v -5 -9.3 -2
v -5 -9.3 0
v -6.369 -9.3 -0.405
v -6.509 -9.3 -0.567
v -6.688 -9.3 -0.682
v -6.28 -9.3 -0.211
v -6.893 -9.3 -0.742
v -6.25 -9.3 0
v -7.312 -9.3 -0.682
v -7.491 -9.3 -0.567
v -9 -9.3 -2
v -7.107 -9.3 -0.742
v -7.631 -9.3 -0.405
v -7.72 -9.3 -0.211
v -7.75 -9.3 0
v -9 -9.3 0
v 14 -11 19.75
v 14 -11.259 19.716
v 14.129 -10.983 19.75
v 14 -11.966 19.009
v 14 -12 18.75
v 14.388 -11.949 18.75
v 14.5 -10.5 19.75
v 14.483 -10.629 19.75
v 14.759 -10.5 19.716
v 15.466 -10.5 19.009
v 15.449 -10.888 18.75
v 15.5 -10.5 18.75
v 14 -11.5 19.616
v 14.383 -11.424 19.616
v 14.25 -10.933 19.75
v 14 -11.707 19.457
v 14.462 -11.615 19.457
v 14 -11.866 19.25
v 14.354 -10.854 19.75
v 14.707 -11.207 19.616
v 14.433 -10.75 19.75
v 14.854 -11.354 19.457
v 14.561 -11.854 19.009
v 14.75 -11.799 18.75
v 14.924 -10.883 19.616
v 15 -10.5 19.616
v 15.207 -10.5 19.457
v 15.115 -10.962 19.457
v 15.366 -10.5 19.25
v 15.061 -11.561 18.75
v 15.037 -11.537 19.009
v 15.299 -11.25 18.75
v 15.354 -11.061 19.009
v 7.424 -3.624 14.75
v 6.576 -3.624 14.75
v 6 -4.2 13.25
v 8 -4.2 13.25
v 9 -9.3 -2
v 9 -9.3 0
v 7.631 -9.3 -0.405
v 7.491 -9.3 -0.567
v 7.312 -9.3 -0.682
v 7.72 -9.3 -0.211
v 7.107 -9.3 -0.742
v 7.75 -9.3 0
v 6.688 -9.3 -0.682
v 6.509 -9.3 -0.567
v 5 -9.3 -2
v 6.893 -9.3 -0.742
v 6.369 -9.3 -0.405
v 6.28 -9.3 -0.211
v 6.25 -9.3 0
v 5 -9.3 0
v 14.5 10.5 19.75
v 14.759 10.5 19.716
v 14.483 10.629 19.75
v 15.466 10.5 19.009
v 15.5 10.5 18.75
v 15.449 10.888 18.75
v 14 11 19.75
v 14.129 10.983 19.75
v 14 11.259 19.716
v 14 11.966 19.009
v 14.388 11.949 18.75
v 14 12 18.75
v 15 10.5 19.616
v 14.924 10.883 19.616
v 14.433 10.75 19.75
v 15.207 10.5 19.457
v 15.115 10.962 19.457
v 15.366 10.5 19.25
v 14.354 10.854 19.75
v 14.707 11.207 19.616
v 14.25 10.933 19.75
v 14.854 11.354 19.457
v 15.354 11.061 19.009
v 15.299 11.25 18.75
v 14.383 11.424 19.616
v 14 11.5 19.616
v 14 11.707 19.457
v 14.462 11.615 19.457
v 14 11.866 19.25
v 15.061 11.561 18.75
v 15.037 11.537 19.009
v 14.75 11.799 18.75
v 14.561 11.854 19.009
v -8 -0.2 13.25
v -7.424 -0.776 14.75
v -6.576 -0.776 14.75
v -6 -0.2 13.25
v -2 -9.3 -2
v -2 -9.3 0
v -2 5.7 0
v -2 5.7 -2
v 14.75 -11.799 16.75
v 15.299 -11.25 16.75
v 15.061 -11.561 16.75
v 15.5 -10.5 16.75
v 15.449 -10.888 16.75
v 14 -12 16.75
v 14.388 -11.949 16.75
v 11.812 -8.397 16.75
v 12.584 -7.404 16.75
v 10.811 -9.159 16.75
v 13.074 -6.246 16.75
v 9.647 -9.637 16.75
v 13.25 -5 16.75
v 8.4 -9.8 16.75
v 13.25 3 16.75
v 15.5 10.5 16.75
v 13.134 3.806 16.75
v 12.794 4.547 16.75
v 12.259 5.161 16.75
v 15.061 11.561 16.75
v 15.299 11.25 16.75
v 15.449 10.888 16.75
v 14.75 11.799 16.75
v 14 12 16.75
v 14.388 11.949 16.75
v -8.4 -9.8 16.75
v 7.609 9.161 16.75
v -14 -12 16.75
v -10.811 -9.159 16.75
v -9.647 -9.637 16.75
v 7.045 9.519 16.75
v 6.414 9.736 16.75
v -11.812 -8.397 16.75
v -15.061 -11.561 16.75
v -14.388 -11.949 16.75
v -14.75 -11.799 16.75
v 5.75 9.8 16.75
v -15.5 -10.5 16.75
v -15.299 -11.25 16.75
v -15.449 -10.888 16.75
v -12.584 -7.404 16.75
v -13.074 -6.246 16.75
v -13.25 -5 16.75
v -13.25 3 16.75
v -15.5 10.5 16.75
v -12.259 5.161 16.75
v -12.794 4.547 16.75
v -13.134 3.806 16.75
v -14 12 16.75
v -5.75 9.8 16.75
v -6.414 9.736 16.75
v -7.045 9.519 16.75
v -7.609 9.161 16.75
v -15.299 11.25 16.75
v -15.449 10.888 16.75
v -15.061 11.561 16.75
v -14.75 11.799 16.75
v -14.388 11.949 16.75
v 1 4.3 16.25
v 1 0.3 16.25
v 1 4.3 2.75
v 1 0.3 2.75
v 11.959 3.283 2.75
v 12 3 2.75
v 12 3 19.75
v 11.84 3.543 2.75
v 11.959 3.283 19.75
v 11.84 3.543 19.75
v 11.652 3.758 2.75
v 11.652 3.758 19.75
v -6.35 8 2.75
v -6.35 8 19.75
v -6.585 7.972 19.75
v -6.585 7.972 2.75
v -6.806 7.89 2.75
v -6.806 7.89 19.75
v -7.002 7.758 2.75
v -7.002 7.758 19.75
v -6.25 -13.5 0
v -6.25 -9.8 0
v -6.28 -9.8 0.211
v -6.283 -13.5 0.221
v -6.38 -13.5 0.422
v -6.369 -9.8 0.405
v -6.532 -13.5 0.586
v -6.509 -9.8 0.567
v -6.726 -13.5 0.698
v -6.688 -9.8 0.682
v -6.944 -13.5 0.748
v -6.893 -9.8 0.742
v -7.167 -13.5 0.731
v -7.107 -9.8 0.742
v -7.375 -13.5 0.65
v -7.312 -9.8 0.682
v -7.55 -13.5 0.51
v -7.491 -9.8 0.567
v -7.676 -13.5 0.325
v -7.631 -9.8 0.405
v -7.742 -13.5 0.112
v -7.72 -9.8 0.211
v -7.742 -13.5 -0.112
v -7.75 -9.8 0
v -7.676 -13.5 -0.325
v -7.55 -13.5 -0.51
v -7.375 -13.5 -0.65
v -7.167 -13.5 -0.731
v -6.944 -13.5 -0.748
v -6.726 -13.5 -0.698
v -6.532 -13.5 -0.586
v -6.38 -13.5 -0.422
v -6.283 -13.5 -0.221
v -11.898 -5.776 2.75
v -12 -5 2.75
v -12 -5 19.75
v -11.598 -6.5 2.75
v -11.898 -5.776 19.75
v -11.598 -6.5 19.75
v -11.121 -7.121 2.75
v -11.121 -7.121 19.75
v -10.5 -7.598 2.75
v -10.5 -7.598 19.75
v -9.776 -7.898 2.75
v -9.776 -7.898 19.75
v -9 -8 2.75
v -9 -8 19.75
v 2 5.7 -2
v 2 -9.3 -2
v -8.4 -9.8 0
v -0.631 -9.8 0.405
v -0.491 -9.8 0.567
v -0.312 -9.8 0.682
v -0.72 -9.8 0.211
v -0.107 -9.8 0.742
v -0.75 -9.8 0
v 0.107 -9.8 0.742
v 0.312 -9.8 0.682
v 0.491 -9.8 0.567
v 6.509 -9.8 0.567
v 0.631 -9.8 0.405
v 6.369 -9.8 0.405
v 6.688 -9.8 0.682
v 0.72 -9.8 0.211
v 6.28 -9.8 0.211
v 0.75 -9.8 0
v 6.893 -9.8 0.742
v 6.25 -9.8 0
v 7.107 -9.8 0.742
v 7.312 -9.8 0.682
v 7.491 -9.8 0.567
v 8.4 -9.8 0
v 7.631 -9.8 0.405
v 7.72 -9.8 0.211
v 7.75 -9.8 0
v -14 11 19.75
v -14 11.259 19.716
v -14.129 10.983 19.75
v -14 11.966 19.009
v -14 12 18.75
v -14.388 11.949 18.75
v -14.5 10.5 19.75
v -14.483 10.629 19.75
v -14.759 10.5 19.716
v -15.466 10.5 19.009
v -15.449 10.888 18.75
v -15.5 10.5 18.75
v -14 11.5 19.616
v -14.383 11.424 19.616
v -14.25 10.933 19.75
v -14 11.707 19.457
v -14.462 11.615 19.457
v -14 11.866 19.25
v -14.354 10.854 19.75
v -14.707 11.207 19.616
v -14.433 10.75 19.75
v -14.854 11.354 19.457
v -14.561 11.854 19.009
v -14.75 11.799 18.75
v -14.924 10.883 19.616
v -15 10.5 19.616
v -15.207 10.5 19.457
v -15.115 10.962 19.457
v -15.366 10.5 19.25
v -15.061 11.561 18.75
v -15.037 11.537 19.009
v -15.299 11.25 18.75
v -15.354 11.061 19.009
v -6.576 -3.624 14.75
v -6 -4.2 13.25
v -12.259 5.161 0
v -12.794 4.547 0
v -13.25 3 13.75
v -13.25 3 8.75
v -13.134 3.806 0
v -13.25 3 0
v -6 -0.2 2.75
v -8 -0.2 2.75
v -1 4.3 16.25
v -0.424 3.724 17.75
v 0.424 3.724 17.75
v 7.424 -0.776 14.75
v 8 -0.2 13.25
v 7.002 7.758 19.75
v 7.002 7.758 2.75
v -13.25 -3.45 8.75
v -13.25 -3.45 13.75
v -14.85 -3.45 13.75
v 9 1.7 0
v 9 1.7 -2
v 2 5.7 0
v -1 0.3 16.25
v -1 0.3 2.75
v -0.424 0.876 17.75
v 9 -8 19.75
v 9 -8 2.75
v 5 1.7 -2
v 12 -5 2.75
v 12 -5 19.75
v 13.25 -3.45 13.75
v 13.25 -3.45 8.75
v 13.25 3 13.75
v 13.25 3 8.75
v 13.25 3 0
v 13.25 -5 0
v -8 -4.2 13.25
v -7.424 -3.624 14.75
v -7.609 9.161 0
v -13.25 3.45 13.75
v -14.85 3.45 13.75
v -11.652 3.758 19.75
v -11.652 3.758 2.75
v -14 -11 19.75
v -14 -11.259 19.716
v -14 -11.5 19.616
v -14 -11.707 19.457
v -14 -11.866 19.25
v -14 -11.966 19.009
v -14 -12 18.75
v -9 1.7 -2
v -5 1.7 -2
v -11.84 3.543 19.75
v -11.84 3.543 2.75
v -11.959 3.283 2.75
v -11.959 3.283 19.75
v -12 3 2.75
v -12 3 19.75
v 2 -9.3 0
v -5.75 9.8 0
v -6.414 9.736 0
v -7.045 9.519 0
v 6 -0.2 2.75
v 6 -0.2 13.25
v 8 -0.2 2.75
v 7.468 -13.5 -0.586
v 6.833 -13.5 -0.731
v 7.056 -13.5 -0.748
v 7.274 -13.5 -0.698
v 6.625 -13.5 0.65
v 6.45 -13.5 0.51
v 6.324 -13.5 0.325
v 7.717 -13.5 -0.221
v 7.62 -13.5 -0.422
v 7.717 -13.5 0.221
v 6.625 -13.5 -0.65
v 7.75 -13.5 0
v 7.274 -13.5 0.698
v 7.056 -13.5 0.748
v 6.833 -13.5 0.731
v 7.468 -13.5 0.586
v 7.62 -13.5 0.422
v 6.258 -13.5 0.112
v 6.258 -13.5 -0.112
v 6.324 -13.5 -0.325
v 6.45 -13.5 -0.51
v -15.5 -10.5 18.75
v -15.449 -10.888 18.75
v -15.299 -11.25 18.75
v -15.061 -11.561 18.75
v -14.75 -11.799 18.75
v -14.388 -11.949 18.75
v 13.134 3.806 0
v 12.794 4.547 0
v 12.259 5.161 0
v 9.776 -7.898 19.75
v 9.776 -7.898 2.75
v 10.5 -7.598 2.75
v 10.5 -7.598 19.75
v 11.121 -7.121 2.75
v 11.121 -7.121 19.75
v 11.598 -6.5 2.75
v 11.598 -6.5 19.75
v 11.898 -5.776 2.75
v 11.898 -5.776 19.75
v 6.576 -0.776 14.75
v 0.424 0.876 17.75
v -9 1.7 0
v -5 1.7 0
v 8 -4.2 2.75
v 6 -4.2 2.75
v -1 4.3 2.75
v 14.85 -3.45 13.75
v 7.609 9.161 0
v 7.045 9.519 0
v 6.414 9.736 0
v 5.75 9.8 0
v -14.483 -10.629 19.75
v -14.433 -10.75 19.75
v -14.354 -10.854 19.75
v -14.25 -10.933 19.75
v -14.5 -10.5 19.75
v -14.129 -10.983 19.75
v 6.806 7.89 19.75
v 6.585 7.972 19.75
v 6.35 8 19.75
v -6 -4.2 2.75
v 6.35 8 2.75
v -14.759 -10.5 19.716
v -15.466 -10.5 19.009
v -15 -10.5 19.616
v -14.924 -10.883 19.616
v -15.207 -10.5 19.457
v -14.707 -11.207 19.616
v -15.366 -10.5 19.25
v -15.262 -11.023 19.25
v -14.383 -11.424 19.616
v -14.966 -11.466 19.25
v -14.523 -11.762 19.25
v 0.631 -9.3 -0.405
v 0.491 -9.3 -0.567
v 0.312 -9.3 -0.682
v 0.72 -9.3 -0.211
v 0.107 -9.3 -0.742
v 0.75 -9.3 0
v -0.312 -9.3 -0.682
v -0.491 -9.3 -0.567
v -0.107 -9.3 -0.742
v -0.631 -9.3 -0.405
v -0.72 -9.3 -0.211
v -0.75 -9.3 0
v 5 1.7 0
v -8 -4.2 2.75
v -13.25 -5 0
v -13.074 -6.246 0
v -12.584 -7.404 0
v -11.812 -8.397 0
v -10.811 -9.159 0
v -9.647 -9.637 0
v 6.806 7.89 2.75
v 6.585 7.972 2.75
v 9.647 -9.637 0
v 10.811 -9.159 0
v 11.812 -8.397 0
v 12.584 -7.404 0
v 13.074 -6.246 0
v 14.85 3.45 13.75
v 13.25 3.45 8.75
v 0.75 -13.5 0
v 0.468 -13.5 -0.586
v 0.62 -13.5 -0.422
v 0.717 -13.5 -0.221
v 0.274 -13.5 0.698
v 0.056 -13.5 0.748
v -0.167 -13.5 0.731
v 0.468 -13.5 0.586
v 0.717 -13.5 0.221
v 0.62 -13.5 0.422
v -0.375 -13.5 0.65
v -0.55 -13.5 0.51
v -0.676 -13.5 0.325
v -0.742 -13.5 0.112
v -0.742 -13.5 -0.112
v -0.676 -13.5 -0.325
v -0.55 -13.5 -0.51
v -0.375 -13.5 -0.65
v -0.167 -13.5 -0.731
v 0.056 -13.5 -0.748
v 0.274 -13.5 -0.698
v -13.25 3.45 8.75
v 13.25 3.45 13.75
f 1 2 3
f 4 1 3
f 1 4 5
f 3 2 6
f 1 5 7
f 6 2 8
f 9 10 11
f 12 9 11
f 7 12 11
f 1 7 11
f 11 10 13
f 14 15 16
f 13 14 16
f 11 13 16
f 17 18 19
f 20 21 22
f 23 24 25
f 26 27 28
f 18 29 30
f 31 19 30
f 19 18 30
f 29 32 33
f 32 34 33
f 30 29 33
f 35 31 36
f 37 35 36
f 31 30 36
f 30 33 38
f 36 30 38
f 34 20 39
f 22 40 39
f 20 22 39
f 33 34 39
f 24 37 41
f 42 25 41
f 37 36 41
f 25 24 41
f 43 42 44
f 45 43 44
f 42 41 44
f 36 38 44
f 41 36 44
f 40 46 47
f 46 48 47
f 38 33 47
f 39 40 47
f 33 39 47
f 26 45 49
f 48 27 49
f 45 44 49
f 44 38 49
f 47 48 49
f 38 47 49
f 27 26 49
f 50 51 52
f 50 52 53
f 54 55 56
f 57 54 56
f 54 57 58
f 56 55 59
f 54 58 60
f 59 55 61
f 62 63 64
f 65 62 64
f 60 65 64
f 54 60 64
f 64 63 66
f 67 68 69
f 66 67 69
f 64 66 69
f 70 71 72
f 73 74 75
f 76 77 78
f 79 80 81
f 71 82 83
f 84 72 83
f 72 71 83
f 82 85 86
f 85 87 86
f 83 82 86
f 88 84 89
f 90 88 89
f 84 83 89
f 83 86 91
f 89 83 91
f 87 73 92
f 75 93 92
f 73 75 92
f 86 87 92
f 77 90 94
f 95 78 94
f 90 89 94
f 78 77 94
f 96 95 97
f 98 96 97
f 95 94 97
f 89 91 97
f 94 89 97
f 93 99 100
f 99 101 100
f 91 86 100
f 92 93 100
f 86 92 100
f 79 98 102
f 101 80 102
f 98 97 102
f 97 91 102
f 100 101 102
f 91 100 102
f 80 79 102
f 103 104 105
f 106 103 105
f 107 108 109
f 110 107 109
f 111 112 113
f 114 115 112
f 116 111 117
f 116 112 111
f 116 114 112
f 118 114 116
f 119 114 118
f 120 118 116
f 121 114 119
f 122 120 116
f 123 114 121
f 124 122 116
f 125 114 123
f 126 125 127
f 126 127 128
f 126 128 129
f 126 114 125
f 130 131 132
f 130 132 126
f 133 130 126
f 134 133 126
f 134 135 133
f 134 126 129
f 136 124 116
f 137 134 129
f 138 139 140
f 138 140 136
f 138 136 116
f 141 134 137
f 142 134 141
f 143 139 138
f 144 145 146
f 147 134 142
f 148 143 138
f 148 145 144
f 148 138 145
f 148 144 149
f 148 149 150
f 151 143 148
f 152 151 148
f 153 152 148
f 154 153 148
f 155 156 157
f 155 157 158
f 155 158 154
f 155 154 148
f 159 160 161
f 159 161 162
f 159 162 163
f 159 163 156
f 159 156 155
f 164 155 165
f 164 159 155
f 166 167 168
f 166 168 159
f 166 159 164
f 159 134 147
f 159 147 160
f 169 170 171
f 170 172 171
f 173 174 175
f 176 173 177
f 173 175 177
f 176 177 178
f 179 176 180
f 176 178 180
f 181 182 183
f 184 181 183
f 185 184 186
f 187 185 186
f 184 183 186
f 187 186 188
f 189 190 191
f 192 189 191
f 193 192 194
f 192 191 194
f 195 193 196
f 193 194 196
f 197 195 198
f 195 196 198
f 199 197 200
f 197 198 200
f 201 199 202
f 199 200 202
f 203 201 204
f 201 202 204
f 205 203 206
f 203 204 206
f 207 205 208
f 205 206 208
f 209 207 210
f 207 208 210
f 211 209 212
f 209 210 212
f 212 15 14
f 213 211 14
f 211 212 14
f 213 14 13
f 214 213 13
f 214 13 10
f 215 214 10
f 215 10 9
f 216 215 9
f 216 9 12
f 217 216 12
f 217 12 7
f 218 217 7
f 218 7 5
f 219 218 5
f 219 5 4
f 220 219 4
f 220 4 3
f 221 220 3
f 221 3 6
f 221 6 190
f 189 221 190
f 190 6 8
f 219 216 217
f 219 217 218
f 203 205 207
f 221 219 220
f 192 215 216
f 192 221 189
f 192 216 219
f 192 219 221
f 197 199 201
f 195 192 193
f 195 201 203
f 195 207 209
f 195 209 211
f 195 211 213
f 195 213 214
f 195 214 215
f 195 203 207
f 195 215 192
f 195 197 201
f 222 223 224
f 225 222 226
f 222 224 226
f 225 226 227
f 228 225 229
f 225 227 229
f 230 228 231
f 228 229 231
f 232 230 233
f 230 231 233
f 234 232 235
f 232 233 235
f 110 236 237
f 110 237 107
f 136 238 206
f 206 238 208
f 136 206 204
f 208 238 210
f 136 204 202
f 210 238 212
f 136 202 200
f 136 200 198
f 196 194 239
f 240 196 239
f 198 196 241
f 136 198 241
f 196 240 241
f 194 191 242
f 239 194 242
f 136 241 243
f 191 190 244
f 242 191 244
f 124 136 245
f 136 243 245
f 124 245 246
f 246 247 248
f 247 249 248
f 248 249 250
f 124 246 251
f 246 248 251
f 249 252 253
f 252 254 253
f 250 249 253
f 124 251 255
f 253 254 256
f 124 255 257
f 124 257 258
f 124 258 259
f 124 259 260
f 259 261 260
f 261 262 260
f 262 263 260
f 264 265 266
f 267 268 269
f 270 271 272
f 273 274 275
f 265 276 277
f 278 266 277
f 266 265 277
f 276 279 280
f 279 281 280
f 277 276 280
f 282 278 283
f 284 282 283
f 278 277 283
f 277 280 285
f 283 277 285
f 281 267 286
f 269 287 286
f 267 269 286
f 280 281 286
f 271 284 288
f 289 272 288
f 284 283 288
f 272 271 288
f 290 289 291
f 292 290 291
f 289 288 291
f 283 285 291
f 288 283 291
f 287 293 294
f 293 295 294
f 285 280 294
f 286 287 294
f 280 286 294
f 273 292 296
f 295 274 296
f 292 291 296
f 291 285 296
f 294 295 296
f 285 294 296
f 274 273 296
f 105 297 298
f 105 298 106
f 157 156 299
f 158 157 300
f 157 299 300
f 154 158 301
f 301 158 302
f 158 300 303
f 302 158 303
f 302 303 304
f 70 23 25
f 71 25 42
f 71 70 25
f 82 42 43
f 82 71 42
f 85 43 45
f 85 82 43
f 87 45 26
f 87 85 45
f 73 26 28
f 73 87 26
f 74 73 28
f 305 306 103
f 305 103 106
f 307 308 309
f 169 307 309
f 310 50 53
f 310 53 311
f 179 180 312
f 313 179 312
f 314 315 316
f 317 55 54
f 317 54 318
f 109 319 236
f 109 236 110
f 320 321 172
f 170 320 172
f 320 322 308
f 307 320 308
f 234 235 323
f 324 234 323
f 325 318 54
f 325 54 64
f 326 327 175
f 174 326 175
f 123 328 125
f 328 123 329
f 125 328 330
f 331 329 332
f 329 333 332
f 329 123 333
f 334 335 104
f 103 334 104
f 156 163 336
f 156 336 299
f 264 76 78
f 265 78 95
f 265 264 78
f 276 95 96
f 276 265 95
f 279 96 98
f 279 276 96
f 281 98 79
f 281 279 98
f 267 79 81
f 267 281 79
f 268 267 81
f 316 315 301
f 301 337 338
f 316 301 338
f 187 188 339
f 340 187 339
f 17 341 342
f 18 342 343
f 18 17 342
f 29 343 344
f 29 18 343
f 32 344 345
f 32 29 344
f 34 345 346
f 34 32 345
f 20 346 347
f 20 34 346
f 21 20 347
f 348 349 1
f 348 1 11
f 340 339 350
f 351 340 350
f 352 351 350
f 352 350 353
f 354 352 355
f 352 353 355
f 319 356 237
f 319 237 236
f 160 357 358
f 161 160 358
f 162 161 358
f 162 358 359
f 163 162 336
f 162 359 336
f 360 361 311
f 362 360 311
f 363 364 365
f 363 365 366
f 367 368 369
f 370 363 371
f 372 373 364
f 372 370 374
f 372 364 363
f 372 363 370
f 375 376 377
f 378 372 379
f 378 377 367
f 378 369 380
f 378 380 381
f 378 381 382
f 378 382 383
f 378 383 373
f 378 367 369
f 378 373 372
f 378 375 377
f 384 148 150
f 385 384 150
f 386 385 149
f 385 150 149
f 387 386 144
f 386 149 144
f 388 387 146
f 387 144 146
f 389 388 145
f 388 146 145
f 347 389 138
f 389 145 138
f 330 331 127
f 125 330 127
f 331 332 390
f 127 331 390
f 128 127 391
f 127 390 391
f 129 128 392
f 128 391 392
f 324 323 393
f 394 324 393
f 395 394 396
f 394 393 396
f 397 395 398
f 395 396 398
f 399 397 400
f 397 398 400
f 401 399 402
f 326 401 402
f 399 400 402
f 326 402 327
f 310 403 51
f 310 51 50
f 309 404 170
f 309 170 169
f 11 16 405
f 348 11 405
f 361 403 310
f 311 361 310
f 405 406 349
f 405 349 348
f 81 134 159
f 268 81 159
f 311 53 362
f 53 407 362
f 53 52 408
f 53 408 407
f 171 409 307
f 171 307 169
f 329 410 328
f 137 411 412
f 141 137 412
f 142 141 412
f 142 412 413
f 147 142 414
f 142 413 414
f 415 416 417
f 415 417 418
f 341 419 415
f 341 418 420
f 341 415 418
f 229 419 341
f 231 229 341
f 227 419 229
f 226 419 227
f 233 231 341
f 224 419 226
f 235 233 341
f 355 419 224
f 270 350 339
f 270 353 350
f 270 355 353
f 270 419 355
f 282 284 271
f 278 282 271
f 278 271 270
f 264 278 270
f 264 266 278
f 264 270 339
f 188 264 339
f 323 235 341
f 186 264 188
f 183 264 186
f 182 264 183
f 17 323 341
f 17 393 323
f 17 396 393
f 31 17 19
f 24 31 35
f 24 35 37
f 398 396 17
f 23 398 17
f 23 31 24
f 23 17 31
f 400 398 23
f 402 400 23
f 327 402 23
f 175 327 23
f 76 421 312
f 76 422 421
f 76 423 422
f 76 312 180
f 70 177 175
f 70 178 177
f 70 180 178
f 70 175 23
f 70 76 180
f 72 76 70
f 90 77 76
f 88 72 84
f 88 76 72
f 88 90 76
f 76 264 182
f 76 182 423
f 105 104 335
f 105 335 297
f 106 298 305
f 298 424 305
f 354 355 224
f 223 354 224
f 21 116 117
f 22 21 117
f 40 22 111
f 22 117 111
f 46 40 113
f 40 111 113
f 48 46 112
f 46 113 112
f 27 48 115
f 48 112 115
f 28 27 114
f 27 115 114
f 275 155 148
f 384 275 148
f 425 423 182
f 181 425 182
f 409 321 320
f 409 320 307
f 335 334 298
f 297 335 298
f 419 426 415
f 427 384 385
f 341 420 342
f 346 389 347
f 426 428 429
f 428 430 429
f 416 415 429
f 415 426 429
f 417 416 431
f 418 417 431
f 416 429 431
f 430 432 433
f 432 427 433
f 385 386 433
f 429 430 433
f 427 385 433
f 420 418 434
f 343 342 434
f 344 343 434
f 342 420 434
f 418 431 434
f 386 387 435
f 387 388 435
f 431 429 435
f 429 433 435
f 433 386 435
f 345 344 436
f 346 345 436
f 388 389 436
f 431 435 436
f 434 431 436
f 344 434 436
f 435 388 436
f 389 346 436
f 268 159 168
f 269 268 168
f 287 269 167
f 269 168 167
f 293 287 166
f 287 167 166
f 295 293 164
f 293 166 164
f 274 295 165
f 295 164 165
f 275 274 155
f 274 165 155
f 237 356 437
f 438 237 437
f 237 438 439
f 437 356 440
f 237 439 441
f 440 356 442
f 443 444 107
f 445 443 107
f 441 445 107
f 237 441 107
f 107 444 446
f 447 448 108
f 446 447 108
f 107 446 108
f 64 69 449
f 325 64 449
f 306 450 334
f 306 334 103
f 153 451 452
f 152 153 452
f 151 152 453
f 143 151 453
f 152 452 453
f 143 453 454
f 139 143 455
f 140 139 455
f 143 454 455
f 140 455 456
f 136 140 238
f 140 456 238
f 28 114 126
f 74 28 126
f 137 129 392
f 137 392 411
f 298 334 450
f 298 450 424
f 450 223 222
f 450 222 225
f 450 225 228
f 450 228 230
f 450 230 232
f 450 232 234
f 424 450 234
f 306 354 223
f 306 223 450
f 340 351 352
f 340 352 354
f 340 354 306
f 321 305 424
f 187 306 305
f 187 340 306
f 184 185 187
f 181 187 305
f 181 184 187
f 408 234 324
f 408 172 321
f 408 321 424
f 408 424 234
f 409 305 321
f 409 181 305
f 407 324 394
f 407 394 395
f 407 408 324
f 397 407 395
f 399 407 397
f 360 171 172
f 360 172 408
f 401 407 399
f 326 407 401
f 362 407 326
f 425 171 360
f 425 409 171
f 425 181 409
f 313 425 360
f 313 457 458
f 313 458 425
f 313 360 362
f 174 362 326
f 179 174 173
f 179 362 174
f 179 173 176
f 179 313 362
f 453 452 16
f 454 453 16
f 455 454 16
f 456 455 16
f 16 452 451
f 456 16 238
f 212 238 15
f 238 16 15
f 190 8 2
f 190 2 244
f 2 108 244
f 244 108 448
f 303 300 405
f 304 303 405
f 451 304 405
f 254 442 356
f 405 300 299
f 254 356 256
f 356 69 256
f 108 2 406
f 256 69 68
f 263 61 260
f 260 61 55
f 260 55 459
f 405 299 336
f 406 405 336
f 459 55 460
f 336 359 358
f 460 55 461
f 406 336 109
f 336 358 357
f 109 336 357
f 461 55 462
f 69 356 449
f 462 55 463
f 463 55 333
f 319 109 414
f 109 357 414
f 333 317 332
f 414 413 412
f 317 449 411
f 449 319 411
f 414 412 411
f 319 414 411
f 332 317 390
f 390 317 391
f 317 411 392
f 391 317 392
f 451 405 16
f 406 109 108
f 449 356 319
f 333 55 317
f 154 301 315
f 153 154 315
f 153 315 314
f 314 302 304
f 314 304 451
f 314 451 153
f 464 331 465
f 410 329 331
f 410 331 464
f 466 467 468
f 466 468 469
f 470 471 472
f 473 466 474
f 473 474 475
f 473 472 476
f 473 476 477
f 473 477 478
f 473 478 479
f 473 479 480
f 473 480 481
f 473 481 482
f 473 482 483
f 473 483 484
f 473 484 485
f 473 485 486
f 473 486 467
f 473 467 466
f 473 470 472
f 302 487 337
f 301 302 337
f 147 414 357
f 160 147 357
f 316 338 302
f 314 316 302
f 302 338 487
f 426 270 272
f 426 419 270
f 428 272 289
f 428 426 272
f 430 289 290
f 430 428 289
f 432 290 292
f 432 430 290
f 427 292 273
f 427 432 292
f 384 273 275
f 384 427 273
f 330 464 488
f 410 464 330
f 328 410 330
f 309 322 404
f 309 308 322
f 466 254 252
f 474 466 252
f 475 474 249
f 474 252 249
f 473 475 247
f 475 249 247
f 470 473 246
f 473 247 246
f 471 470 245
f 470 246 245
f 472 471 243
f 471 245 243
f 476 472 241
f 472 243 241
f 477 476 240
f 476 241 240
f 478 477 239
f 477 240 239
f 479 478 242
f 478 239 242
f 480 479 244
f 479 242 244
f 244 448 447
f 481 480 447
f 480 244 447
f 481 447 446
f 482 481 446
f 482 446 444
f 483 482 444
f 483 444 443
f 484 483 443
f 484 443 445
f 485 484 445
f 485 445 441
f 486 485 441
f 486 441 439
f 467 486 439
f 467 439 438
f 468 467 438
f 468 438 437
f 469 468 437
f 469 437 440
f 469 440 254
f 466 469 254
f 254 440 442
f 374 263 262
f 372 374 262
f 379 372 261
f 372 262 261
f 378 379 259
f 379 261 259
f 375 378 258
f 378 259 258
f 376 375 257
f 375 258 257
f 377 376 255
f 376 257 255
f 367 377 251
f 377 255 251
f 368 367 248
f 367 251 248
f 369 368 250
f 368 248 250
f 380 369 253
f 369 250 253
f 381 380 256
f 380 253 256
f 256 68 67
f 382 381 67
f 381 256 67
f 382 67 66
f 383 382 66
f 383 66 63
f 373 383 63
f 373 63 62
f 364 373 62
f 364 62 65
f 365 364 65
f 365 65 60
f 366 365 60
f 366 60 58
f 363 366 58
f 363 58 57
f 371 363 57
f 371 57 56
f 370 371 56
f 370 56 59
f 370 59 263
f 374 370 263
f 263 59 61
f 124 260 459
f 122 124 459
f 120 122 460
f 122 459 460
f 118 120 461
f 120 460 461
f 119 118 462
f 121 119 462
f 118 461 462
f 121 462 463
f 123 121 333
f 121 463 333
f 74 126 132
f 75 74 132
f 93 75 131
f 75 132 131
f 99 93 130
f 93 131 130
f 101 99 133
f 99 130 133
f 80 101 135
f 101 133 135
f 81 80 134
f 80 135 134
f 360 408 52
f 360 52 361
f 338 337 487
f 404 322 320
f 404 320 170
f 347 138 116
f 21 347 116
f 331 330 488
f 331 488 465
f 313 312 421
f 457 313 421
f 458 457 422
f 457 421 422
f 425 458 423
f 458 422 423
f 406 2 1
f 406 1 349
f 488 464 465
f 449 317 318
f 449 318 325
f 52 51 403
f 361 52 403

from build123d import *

# Parameters (mm, degrees)
EXTRUDE1_DEPTH         = 19.75
CUT_EXTRUDE1_DEPTH     = 17
SKETCH3_OUTSIDE_W      = 41.78
SKETCH3_OUTSIDE_H      = 34.78
CUT_EXTRUDE2_DEPTH     = 16.75
SKETCH4_W              = 2
SKETCH4_H              = 4
EXTRUDE2_DEPTH         = 15
SKETCH5_W              = 2
SKETCH5_H              = 4
CUT_EXTRUDE3_DEPTH     = 3
CHAMFER1_SIZE          = 1.5
CHAMFER1_SIZE2         = 0.575796053
CHAMFER1_PART_2_SIZE   = 1.5
CHAMFER1_PART_2_SIZE2  = 0.575796053
CHAMFER1_PART_3_SIZE   = 1.5
CHAMFER1_PART_3_SIZE2  = 0.575796053
CHAMFER1_PART_4_SIZE   = 1.5
CHAMFER1_PART_4_SIZE2  = 0.575796053
CHAMFER1_PART_5_SIZE   = 1.5
CHAMFER1_PART_5_SIZE2  = 0.575796053
CHAMFER1_PART_6_SIZE   = 1.5
CHAMFER1_PART_6_SIZE2  = 0.575796053
CHAMFER1_PART_7_SIZE   = 1.5
CHAMFER1_PART_7_SIZE2  = 0.575796053
CHAMFER1_PART_8_SIZE   = 1.5
CHAMFER1_PART_8_SIZE2  = 0.575796053
CHAMFER1_PART_9_SIZE   = 1.5
CHAMFER1_PART_9_SIZE2  = 0.575796053
CHAMFER1_PART_10_SIZE  = 1.5
CHAMFER1_PART_10_SIZE2 = 0.575796053
CHAMFER1_PART_11_SIZE  = 1.5
CHAMFER1_PART_11_SIZE2 = 0.575796053
CHAMFER1_PART_12_SIZE  = 1.5
CHAMFER1_PART_12_SIZE2 = 0.575796053
FILLET1_R              = 1
EXTRUDE3_DEPTH         = 3.45
SKETCH7_W              = 4
SKETCH7_H              = 15
SKETCH7_H_2            = 11
EXTRUDE4_DEPTH         = 2
SKETCH8_R              = 0.75
EXTRUDE5_DEPTH         = 4.2


with BuildPart() as part:
    # Sketch1 → Extrude1 (new body)
    with BuildSketch(Plane.XY):
        with BuildLine():
            Line((-14, -12), (14, -12))
            ThreePointArc((14, -12), (15.060660172, -11.560660172), (15.5, -10.5))
            Line((15.5, -10.5), (15.5, 10.5))
            ThreePointArc((15.5, 10.5), (15.060660172, 11.560660172), (14, 12))
            Line((14, 12), (-14, 12))
            ThreePointArc((-14, 12), (-15.060660172, 11.560660172), (-15.5, 10.5))
            Line((-15.5, 10.5), (-15.5, -10.5))
            ThreePointArc((-15.5, -10.5), (-15.060660172, -11.560660172), (-14, -12))
        make_face()
    extrude(amount=EXTRUDE1_DEPTH)

    # Sketch2 → Cut-Extrude1 (cut)
    with BuildSketch(Plane.XY.offset(19.75)):
        with BuildLine():
            Line((-12, 3), (-12, -5))
            ThreePointArc((-12, -5), (-11.121320344, -7.121320344), (-9, -8))
            Line((-9, -8), (9, -8))
            ThreePointArc((9, -8), (11.121320344, -7.121320344), (12, -5))
            Line((12, -5), (12, 3))
            ThreePointArc((12, 3), (11.908882001, 3.417053364), (11.652132983, 3.758104592))
            Line((11.652132983, 3.758104592), (7.002132983, 7.758104592))
            ThreePointArc((7.002132983, 7.758104592), (6.697775364, 7.937577888), (6.35, 8))
            Line((6.35, 8), (-6.35, 8))
            ThreePointArc((-6.35, 8), (-6.697775364, 7.937577888), (-7.002132983, 7.758104592))
            Line((-7.002132983, 7.758104592), (-11.652132983, 3.758104592))
            ThreePointArc((-11.652132983, 3.758104592), (-11.908882001, 3.417053364), (-12, 3))
        make_face()
    extrude(amount=-CUT_EXTRUDE1_DEPTH, mode=Mode.SUBTRACT)

    # Sketch3 outside → Cut-Extrude2 (cut)
    with BuildSketch(Plane(origin=(0, 0, 0), x_dir=(-1, 0, 0), z_dir=(0, 0, -1))):
        Rectangle(SKETCH3_OUTSIDE_W, SKETCH3_OUTSIDE_H)
        with BuildLine():
            Line((13.25, 3), (13.25, -5))
            ThreePointArc((13.25, -5), (11.811910569, -8.397190887), (8.4, -9.8))
            Line((8.4, -9.8), (-8.4, -9.8))
            ThreePointArc((-8.4, -9.8), (-11.811910569, -8.397190887), (-13.25, -5))
            Line((-13.25, -5), (-13.25, 3))
            ThreePointArc((-13.25, 3), (-12.990313702, 4.188602088), (-12.258579001, 5.160598088))
            Line((-12.258579001, 5.160598088), (-7.608579001, 9.160598088))
            ThreePointArc((-7.608579001, 9.160598088), (-6.736153383, 9.645587911), (-5.75, 9.8))
            Line((-5.75, 9.8), (5.75, 9.8))
            ThreePointArc((5.75, 9.8), (6.736153383, 9.645587911), (7.608579001, 9.160598088))
            Line((7.608579001, 9.160598088), (12.258579001, 5.160598088))
            ThreePointArc((12.258579001, 5.160598088), (12.990313702, 4.188602088), (13.25, 3))
        make_face(mode=Mode.SUBTRACT)
    extrude(amount=-CUT_EXTRUDE2_DEPTH, mode=Mode.SUBTRACT)

    # Sketch4 → Extrude2 (add)
    with BuildSketch(Plane.XY.offset(2.75)):
        with Locations((0, 2.3)):
            Rectangle(SKETCH4_W, SKETCH4_H)
        with Locations((-7, -2.2)):
            Rectangle(SKETCH4_W, SKETCH4_H)
        with Locations((7, -2.2)):
            Rectangle(SKETCH4_W, SKETCH4_H)
    extrude(amount=EXTRUDE2_DEPTH)

    # Sketch5 → Cut-Extrude3 (cut)
    with BuildSketch(Plane.XY.offset(17.75)):
        with Locations((7, -2.2)):
            Rectangle(SKETCH5_W, SKETCH5_H)
        with Locations((-7, -2.2)):
            Rectangle(SKETCH5_W, SKETCH5_H)
    extrude(amount=-CUT_EXTRUDE3_DEPTH, mode=Mode.SUBTRACT)

    # Chamfer1
    chamfer1_edges = [part.edges().sort_by_distance(p)[0] for p in [
        (0, 4.3, 17.75),
    ]]
    chamfer1_side = [part.faces().sort_by_distance(p)[0] for p in [
        (0, 4.3, 10.25),
    ]]
    chamfer(chamfer1_edges, length=CHAMFER1_SIZE, length2=CHAMFER1_SIZE2, reference=chamfer1_side[0])

    # Chamfer1 part 2
    chamfer1_part_2_edges = [part.edges().sort_by_distance(p)[0] for p in [
        (-1, 2.3, 17.75),
    ]]
    chamfer1_part_2_side = [part.faces().sort_by_distance(p)[0] for p in [
        (-1, 2.3, 10.25),
    ]]
    chamfer(chamfer1_part_2_edges, length=CHAMFER1_PART_2_SIZE, length2=CHAMFER1_PART_2_SIZE2, reference=chamfer1_part_2_side[0])

    # Chamfer1 part 3
    chamfer1_part_3_edges = [part.edges().sort_by_distance(p)[0] for p in [
        (0, 0.3, 17.75),
    ]]
    chamfer1_part_3_side = [part.faces().sort_by_distance(p)[0] for p in [
        (0, 0.3, 10.25),
    ]]
    chamfer(chamfer1_part_3_edges, length=CHAMFER1_PART_3_SIZE, length2=CHAMFER1_PART_3_SIZE2, reference=chamfer1_part_3_side[0])

    # Chamfer1 part 4
    chamfer1_part_4_edges = [part.edges().sort_by_distance(p)[0] for p in [
        (1, 2.3, 17.75),
    ]]
    chamfer1_part_4_side = [part.faces().sort_by_distance(p)[0] for p in [
        (1, 2.3, 10.25),
    ]]
    chamfer(chamfer1_part_4_edges, length=CHAMFER1_PART_4_SIZE, length2=CHAMFER1_PART_4_SIZE2, reference=chamfer1_part_4_side[0])

    # Chamfer1 part 5
    chamfer1_part_5_edges = [part.edges().sort_by_distance(p)[0] for p in [
        (7, -4.2, 14.75),
    ]]
    chamfer1_part_5_side = [part.faces().sort_by_distance(p)[0] for p in [
        (7, -4.2, 8.75),
    ]]
    chamfer(chamfer1_part_5_edges, length=CHAMFER1_PART_5_SIZE, length2=CHAMFER1_PART_5_SIZE2, reference=chamfer1_part_5_side[0])

    # Chamfer1 part 6
    chamfer1_part_6_edges = [part.edges().sort_by_distance(p)[0] for p in [
        (6, -2.2, 14.75),
    ]]
    chamfer1_part_6_side = [part.faces().sort_by_distance(p)[0] for p in [
        (6, -2.2, 8.75),
    ]]
    chamfer(chamfer1_part_6_edges, length=CHAMFER1_PART_6_SIZE, length2=CHAMFER1_PART_6_SIZE2, reference=chamfer1_part_6_side[0])

    # Chamfer1 part 7
    chamfer1_part_7_edges = [part.edges().sort_by_distance(p)[0] for p in [
        (7, -0.2, 14.75),
    ]]
    chamfer1_part_7_side = [part.faces().sort_by_distance(p)[0] for p in [
        (7, -0.2, 8.75),
    ]]
    chamfer(chamfer1_part_7_edges, length=CHAMFER1_PART_7_SIZE, length2=CHAMFER1_PART_7_SIZE2, reference=chamfer1_part_7_side[0])

    # Chamfer1 part 8
    chamfer1_part_8_edges = [part.edges().sort_by_distance(p)[0] for p in [
        (8, -2.2, 14.75),
    ]]
    chamfer1_part_8_side = [part.faces().sort_by_distance(p)[0] for p in [
        (8, -2.2, 8.75),
    ]]
    chamfer(chamfer1_part_8_edges, length=CHAMFER1_PART_8_SIZE, length2=CHAMFER1_PART_8_SIZE2, reference=chamfer1_part_8_side[0])

    # Chamfer1 part 9
    chamfer1_part_9_edges = [part.edges().sort_by_distance(p)[0] for p in [
        (-7, -4.2, 14.75),
    ]]
    chamfer1_part_9_side = [part.faces().sort_by_distance(p)[0] for p in [
        (-7, -4.2, 8.75),
    ]]
    chamfer(chamfer1_part_9_edges, length=CHAMFER1_PART_9_SIZE, length2=CHAMFER1_PART_9_SIZE2, reference=chamfer1_part_9_side[0])

    # Chamfer1 part 10
    chamfer1_part_10_edges = [part.edges().sort_by_distance(p)[0] for p in [
        (-8, -2.2, 14.75),
    ]]
    chamfer1_part_10_side = [part.faces().sort_by_distance(p)[0] for p in [
        (-8, -2.2, 8.75),
    ]]
    chamfer(chamfer1_part_10_edges, length=CHAMFER1_PART_10_SIZE, length2=CHAMFER1_PART_10_SIZE2, reference=chamfer1_part_10_side[0])

    # Chamfer1 part 11
    chamfer1_part_11_edges = [part.edges().sort_by_distance(p)[0] for p in [
        (-7, -0.2, 14.75),
    ]]
    chamfer1_part_11_side = [part.faces().sort_by_distance(p)[0] for p in [
        (-7, -0.2, 8.75),
    ]]
    chamfer(chamfer1_part_11_edges, length=CHAMFER1_PART_11_SIZE, length2=CHAMFER1_PART_11_SIZE2, reference=chamfer1_part_11_side[0])

    # Chamfer1 part 12
    chamfer1_part_12_edges = [part.edges().sort_by_distance(p)[0] for p in [
        (-6, -2.2, 14.75),
    ]]
    chamfer1_part_12_side = [part.faces().sort_by_distance(p)[0] for p in [
        (-6, -2.2, 8.75),
    ]]
    chamfer(chamfer1_part_12_edges, length=CHAMFER1_PART_12_SIZE, length2=CHAMFER1_PART_12_SIZE2, reference=chamfer1_part_12_side[0])

    # Fillet1
    fillet1_edges = [part.edges().sort_by_distance(p)[0] for p in [
        (-15.060660172, -11.560660172, 19.75),
        (0, -12, 19.75),
        (15.060660172, -11.560660172, 19.75),
        (15.5, 0, 19.75),
        (15.060660172, 11.560660172, 19.75),
        (0, 12, 19.75),
        (-15.060660172, 11.560660172, 19.75),
        (-15.5, 0, 19.75),
    ]]
    fillet(fillet1_edges, radius=FILLET1_R)

    # Sketch6 → Extrude3 (add, symmetric)
    with BuildSketch(Plane(origin=(0, 0, 0), x_dir=(1, 0, 0), z_dir=(0, 1, 0))):
        Polygon((13.25, -13.75), (13.25, -8.75), (14.85, -13.75), align=None)
        Polygon((-14.85, -13.75), (-13.25, -8.75), (-13.25, -13.75), align=None)
    extrude(amount=EXTRUDE3_DEPTH, both=True)

    # Sketch7 → Extrude4 (add)
    with BuildSketch(Plane(origin=(0, 0, 0), x_dir=(-1, 0, 0), z_dir=(0, 0, -1))):
        with Locations((0, -1.8)):
            Rectangle(SKETCH7_W, SKETCH7_H)
        with Locations((-7, -3.8)):
            Rectangle(SKETCH7_W, SKETCH7_H_2)
        with Locations((7, -3.8)):
            Rectangle(SKETCH7_W, SKETCH7_H_2)
    extrude(amount=EXTRUDE4_DEPTH)

    # Sketch8 → Extrude5 (add)
    with BuildSketch(Plane.XZ.offset(9.3)):
        with Locations((7, 0)):
            Circle(SKETCH8_R)
        Circle(SKETCH8_R)
        with Locations((-7, 0)):
            Circle(SKETCH8_R)
    extrude(amount=EXTRUDE5_DEPTH)


solid = part.part
